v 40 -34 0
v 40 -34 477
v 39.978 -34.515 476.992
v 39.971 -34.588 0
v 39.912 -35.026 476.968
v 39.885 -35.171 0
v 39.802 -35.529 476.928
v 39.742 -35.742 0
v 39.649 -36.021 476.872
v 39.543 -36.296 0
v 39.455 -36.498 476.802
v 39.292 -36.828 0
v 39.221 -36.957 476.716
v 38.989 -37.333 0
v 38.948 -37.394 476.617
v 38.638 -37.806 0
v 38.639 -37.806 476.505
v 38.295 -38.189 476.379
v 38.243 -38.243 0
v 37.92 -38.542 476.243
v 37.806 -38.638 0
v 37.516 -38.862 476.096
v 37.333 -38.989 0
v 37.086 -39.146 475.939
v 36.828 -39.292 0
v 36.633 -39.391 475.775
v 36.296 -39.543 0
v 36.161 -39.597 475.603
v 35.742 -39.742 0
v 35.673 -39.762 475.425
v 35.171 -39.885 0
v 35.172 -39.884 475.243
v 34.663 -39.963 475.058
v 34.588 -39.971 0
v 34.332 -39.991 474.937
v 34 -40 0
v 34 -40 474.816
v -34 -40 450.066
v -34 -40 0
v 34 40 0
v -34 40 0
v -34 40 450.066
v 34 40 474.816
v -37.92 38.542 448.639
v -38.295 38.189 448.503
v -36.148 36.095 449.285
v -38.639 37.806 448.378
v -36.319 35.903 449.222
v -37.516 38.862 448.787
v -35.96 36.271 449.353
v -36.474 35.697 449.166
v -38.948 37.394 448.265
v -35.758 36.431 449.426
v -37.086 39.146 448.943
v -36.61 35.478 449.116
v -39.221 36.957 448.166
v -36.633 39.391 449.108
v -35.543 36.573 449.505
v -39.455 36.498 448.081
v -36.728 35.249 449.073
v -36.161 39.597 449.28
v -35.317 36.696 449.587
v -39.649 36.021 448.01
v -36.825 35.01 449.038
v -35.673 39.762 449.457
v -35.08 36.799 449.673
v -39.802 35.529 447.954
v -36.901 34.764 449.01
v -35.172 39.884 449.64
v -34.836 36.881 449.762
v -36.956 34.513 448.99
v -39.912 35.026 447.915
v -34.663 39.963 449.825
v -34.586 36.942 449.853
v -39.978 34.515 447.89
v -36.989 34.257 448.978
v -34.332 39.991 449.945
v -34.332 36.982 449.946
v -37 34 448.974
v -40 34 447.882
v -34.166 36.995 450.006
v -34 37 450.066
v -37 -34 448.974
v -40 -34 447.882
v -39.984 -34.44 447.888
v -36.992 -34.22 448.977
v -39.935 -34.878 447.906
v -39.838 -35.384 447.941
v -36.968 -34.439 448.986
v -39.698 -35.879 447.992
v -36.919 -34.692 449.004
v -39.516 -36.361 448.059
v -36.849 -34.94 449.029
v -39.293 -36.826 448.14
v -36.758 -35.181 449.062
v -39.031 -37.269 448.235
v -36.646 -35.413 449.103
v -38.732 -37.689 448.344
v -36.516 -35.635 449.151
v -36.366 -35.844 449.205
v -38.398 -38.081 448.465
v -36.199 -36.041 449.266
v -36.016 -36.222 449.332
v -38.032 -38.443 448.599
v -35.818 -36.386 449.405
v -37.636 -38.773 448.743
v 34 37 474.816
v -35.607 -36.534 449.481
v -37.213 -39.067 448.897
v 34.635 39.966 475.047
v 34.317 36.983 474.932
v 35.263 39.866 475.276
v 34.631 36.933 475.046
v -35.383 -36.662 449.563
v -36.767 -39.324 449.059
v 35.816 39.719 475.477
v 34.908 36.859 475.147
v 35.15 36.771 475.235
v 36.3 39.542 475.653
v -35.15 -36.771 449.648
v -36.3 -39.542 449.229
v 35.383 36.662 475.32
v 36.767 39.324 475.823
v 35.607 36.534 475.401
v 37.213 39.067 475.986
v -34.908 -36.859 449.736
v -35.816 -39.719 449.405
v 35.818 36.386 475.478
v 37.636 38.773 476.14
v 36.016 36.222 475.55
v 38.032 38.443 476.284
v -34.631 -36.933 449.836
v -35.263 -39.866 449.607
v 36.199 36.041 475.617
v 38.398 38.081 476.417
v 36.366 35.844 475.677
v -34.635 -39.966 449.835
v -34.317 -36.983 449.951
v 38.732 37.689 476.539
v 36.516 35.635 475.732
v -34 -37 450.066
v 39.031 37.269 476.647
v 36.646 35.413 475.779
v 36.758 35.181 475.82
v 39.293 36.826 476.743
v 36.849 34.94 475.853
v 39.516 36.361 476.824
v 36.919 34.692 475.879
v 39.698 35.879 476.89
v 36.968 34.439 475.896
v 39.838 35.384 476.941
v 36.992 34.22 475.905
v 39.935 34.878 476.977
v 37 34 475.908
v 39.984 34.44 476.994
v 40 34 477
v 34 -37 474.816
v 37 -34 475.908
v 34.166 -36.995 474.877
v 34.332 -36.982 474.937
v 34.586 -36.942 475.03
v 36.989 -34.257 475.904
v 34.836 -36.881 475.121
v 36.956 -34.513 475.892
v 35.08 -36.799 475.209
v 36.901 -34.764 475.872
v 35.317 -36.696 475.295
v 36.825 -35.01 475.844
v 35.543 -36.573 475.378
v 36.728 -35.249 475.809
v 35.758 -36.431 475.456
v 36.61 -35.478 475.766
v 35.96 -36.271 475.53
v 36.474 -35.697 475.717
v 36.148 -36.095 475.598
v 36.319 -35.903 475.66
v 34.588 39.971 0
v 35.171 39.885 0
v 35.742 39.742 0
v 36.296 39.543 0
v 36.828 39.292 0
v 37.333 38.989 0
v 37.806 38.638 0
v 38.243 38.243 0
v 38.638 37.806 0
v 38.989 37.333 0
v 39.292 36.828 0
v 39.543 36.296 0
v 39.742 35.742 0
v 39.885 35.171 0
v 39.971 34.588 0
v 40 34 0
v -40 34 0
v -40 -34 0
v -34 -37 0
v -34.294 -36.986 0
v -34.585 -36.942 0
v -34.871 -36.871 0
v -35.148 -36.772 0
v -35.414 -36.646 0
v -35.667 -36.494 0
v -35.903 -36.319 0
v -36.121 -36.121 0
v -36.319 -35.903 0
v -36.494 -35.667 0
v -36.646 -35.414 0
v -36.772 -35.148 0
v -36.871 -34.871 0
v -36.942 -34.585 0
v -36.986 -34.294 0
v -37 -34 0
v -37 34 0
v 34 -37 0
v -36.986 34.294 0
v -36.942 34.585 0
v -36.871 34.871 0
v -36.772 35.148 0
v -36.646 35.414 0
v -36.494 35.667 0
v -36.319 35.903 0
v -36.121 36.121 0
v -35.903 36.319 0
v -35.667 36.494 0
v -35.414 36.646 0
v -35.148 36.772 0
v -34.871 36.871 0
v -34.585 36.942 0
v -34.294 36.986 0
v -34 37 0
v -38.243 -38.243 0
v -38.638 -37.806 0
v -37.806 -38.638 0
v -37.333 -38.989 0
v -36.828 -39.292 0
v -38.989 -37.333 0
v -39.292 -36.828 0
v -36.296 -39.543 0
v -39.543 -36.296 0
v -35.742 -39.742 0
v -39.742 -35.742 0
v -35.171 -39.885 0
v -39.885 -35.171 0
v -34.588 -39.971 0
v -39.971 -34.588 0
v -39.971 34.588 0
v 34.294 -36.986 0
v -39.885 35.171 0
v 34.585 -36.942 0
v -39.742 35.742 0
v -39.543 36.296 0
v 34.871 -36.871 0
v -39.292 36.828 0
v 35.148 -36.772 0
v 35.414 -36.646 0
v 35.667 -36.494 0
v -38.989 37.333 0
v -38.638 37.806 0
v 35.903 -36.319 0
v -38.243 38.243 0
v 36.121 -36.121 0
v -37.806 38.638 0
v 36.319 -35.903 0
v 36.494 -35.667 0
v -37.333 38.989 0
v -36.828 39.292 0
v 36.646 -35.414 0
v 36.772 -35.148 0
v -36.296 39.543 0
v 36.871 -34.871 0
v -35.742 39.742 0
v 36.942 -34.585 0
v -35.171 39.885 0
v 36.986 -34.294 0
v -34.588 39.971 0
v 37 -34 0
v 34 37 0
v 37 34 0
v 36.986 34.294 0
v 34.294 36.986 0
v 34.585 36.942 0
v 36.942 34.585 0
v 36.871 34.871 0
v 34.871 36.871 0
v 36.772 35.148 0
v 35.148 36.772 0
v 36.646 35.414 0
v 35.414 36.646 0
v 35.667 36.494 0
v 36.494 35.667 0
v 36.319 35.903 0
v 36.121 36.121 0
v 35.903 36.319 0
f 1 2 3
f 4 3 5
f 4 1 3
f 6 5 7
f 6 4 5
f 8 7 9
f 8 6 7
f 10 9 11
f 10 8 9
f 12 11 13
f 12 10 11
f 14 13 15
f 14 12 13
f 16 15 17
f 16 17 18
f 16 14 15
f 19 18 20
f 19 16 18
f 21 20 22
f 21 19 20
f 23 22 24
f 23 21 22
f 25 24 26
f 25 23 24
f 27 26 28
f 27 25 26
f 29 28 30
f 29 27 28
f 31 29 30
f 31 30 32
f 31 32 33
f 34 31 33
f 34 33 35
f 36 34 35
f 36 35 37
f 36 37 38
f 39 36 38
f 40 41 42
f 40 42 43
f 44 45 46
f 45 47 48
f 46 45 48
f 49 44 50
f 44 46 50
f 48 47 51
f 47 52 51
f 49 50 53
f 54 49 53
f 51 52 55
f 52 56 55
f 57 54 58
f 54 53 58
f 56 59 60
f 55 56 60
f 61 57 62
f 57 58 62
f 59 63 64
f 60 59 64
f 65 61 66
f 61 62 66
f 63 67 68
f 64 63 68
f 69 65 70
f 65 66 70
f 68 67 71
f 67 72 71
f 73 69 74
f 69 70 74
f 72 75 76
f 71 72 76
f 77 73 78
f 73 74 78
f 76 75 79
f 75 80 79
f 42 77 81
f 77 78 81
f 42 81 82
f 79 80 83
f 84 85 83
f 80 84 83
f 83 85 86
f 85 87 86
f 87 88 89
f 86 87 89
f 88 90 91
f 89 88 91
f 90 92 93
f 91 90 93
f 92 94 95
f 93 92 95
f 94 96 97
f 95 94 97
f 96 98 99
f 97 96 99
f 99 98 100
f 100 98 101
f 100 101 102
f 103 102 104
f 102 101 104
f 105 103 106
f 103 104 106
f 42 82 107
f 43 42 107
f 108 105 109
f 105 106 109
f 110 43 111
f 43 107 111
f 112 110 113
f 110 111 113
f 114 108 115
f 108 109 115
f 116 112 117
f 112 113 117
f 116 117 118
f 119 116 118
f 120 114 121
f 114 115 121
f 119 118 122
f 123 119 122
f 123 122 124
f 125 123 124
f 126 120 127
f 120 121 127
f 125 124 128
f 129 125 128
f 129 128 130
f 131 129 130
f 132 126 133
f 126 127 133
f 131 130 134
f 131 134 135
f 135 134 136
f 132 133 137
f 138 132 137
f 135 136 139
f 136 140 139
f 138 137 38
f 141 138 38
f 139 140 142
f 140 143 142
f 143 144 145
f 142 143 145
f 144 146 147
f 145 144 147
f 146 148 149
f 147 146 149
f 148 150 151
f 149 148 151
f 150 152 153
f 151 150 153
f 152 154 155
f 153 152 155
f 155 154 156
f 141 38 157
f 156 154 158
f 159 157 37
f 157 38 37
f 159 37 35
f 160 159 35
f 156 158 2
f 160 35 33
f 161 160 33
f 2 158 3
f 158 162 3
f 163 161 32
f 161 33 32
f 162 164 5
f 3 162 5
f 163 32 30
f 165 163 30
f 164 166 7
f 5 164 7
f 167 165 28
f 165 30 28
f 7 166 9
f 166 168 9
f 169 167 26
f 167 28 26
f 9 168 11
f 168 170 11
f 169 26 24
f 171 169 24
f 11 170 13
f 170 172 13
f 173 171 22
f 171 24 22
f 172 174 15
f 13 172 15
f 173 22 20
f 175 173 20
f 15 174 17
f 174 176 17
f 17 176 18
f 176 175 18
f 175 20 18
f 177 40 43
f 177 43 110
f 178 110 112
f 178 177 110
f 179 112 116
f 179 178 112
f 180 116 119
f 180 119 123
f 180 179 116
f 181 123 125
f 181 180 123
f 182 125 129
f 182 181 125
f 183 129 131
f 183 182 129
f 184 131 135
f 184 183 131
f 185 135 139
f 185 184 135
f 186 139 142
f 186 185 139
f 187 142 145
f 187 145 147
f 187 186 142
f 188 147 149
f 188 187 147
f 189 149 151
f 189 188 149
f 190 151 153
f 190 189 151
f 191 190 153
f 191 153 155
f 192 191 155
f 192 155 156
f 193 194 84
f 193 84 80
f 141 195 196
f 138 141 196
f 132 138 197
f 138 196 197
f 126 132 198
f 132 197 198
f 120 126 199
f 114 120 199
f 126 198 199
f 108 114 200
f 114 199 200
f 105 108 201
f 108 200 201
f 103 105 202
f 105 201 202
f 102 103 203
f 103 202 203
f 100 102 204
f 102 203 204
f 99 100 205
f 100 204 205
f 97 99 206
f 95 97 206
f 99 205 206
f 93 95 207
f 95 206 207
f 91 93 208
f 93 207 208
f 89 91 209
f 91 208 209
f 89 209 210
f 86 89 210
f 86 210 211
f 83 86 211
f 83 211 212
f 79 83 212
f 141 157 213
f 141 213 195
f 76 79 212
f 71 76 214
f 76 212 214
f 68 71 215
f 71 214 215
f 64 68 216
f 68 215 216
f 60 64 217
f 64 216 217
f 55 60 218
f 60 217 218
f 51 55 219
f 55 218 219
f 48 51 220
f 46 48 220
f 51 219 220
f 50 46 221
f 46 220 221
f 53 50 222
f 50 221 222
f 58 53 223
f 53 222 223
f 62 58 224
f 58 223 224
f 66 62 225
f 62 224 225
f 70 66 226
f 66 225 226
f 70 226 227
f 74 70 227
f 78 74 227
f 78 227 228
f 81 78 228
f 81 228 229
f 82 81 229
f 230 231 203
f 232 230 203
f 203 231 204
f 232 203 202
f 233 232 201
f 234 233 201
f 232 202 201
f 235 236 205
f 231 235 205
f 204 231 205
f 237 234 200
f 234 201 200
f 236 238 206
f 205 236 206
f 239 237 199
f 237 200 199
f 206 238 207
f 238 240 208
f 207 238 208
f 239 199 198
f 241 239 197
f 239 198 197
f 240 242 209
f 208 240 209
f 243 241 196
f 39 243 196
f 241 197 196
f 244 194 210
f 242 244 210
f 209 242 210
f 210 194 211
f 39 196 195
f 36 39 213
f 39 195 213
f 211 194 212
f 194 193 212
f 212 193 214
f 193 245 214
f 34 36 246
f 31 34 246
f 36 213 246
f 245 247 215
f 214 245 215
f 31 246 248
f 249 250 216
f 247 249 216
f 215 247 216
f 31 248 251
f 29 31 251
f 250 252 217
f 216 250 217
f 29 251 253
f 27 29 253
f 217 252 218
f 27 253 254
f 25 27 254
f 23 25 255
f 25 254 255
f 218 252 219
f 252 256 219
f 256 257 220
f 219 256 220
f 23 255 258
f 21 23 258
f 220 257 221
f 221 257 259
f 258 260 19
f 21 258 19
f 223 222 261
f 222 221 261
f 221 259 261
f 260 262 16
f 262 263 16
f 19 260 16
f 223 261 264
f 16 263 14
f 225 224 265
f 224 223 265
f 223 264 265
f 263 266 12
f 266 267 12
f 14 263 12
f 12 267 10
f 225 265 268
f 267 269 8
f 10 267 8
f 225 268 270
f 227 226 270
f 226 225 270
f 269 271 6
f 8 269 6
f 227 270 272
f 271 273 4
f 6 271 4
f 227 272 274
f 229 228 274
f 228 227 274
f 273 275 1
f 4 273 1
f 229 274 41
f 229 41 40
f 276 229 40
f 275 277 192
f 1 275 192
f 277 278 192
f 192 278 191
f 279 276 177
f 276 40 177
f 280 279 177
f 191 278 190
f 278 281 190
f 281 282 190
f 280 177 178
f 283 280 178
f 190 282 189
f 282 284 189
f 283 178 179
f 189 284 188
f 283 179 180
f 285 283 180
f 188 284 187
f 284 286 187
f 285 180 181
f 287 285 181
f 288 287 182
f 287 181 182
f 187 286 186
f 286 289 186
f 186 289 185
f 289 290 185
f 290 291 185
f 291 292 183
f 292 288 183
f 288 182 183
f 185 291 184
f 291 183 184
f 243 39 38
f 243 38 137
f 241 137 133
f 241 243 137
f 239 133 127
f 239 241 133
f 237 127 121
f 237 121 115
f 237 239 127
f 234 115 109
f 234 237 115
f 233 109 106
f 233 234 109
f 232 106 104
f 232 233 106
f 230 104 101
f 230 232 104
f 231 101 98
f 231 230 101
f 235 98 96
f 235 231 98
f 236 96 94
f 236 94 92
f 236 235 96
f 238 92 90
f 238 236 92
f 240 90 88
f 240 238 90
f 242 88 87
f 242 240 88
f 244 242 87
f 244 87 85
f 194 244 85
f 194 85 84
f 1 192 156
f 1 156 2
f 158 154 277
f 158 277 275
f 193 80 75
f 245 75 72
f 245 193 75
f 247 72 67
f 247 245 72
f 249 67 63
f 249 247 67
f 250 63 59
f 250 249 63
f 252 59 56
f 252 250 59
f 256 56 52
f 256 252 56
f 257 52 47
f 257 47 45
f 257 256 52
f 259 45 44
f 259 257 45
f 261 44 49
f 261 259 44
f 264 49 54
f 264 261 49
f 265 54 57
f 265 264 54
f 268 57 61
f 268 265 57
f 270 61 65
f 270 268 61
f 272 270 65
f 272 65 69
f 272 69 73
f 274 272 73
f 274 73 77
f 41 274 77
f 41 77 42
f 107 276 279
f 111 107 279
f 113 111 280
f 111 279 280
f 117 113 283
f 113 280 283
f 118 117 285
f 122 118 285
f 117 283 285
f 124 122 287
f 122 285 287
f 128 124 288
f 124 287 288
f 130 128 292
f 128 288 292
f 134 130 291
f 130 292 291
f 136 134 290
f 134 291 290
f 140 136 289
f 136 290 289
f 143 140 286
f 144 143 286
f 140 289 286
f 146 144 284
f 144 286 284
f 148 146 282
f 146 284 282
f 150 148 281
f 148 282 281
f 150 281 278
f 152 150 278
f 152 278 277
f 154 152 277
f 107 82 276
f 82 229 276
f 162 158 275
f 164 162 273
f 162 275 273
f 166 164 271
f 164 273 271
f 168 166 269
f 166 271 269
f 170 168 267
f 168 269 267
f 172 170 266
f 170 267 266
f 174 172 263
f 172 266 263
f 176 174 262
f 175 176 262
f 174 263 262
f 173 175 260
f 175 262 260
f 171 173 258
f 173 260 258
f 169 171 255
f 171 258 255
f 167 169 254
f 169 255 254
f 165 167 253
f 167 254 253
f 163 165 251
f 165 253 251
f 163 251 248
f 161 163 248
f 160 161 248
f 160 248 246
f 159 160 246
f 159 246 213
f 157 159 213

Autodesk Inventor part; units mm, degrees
ref_plane "YZ Plane" through (0, 0, 0) normal (1, 0, 0) x (0, 1, 0)
ref_plane "Start plane" through (0, 0, 0) normal (0, 0, 1) x (1, 0, 0)
ref_plane "End plane" through (0, 0, 1000) normal (0, 0, 1) x (1, 0, 0)
sketch "Sketch" plane through (0, 0, 0) normal (0, 0, 1) x (1, 0, 0)
  line L0 (-40, -34) -> (-40, 34)
  line L1 (-34, 40) -> (34, 40)
  line L2 (40, 34) -> (40, -34)
  line L3 (34, -40) -> (-34, -40)
  arc A0 (-40, -34) -> (-34, -40) centre (-34, -34) ccw
  arc A1 (40, 34) -> (34, 40) centre (34, 34) ccw
  arc A2 (-34, 40) -> (-40, 34) centre (-34, 34) ccw
  arc A3 (34, -40) -> (40, -34) centre (34, -34) ccw
  arc A4 (-34, 37) -> (-37, 34) centre (-34, 34) ccw
  line L4 (-34, 37) -> (34, 37)
  arc A5 (37, 34) -> (34, 37) centre (34, 34) ccw
  line L5 (37, 34) -> (37, -34)
  arc A6 (34, -37) -> (37, -34) centre (34, -34) ccw
  line L6 (34, -37) -> (-34, -37)
  arc A7 (-37, -34) -> (-34, -37) centre (-34, -34) ccw
  line L7 (-37, -34) -> (-37, 34)
  line L8 (0, 57.7397) -> (0, -57.7397) construction
  line L9 (-1453.6197, 0) -> (290.3864, 0) construction
  dimension "d7" = 6
  dimension "d9" = 80
  dimension "d11" = 80
  dimension "d12" = 3
  dimension "d15" = 40
  dimension "d16" = 40
extrude "Body" add sketch "Sketch" along normal up to surface (1000 mm away) from surface at 0
sketch "Sketch3" plane through (0, 0, 0) normal (0, 0, 1) x (1, 0, 0)
  line L0 (0, 0) -> (10, 0)
ref_plane "Work Plane3" through (0, 0, 0) normal (0, -1, 0) x (1, 0, 0)
sketch "Sketch5" plane through (0, 0, 0) normal (0, 1, 0) x (-1, 0, 0)
  line L0 (-40, 0) -> (-40, 1000) projected
  line L1 (40, 0) -> (40, 1000) projected
  line L2 (40, 0) -> (40, 1000) projected
  line L3 (40, 458.04) -> (415, 458.04) construction
  line L4 (-5.663, 479.3796) -> (835.663, 479.3796) construction
  arc A0 (-5.663, 479.3796) -> (415, 380) centre (415, 1320) ccw construction
  line L5 (-55, 559.2385) -> (885, 559.2385) construction
  arc A1 (-55, 559.2385) -> (-5.663, 479.3796) centre (34.3, 559.2385) ccw construction
  arc A2 (835.663, 479.3796) -> (885, 559.2385) centre (795.7, 559.2385) ccw
  line L6 (-55, 559.2385) -> (-55, 599.2385)
  line L7 (885, 559.2385) -> (885, 599.2385)
  line L8 (-55, 599.2385) -> (415, 599.2385) construction
  line L9 (415, 599.2385) -> (415, 0)
  arc A3 (415, 380) -> (835.663, 479.3796) centre (415, 1320) ccw
  line L10 (415, 599.2385) -> (885, 599.2385)
  point P0 (0, 0)
  dimension "d22" = 375
  dimension "d24" = 940
  dimension "d25" = 89.3
  dimension "d26" = 40
  dimension "d27" = 940
  dimension "d28" = 380
  dimension "d30" = 458.04
sketch "Sketch6" plane through (0, 0, 0) normal (0, 1, 0) x (-1, 0, 0)
  line L0 (40, 0) -> (40, 1000) projected
  line L1 (40, 0) -> (40, 1000) projected
  line L2 (-40, 0) -> (-40, 1000) projected
  line L3 (-40, 0) -> (-40, 1000) projected
  line L4 (34, 1000) -> (40, 1000) projected
  line L5 (40, 1000) -> (-40, 1000)
  arc A0 (-5.663, 479.3796) -> (415, 380) centre (415, 1320) ccw construction
  line L6 (40, 447.8824) -> (-40, 477)
  point P0 (0, 0)
  dimension "d34" = 110
  dimension "d36" = 477
extrude "Extrusion2" cut sketch "Sketch6" along normal through all both and the other way through all
sketch "Sketch4" plane through (0, 0, 0) normal (0, -1, 0) x (1, 0, 0)
  line L0 (-1453.3712, 0) -> (288.8952, 0) projected
  line L1 (-1453.3712, 1000) -> (288.8952, 1000) projected
  dimension "d18" = 1000
equation "\"d7\" = G_IR"
equation "\"d9\" = G_W"
equation "\"d11\" = G_H"
equation "\"d12\" = G_T"
equation "\"d15\" = 0.5 * d9"
equation "\"d16\" = 0.5 * d11"
equation "\"d3\" = G_L"
equation "\"d22\" = 0.5 * Diam_of_legs_center"
equation "\"d24\" = d27"
equation "\"d25\" = 0.095 * d27"
equation "\"d27\" = MAIN_filter_diam"
equation "\"G_W\" = 80"
equation "\"G_H\" = 80"
equation "\"G_T\" = 3"
equation "\"G_IR\" = 6"
equation "\"G_L\" = d18"
equation "\"G_OFFSET_START\" = 0"
equation "\"G_OFFSET_END\" = 0"
equation "\"MAIN_filter_diam\" = 940"
equation "\"Diam_of_legs_center\" = 750"
properties part number "SLM 1692 Leg tube" material "Steel, Mild"
